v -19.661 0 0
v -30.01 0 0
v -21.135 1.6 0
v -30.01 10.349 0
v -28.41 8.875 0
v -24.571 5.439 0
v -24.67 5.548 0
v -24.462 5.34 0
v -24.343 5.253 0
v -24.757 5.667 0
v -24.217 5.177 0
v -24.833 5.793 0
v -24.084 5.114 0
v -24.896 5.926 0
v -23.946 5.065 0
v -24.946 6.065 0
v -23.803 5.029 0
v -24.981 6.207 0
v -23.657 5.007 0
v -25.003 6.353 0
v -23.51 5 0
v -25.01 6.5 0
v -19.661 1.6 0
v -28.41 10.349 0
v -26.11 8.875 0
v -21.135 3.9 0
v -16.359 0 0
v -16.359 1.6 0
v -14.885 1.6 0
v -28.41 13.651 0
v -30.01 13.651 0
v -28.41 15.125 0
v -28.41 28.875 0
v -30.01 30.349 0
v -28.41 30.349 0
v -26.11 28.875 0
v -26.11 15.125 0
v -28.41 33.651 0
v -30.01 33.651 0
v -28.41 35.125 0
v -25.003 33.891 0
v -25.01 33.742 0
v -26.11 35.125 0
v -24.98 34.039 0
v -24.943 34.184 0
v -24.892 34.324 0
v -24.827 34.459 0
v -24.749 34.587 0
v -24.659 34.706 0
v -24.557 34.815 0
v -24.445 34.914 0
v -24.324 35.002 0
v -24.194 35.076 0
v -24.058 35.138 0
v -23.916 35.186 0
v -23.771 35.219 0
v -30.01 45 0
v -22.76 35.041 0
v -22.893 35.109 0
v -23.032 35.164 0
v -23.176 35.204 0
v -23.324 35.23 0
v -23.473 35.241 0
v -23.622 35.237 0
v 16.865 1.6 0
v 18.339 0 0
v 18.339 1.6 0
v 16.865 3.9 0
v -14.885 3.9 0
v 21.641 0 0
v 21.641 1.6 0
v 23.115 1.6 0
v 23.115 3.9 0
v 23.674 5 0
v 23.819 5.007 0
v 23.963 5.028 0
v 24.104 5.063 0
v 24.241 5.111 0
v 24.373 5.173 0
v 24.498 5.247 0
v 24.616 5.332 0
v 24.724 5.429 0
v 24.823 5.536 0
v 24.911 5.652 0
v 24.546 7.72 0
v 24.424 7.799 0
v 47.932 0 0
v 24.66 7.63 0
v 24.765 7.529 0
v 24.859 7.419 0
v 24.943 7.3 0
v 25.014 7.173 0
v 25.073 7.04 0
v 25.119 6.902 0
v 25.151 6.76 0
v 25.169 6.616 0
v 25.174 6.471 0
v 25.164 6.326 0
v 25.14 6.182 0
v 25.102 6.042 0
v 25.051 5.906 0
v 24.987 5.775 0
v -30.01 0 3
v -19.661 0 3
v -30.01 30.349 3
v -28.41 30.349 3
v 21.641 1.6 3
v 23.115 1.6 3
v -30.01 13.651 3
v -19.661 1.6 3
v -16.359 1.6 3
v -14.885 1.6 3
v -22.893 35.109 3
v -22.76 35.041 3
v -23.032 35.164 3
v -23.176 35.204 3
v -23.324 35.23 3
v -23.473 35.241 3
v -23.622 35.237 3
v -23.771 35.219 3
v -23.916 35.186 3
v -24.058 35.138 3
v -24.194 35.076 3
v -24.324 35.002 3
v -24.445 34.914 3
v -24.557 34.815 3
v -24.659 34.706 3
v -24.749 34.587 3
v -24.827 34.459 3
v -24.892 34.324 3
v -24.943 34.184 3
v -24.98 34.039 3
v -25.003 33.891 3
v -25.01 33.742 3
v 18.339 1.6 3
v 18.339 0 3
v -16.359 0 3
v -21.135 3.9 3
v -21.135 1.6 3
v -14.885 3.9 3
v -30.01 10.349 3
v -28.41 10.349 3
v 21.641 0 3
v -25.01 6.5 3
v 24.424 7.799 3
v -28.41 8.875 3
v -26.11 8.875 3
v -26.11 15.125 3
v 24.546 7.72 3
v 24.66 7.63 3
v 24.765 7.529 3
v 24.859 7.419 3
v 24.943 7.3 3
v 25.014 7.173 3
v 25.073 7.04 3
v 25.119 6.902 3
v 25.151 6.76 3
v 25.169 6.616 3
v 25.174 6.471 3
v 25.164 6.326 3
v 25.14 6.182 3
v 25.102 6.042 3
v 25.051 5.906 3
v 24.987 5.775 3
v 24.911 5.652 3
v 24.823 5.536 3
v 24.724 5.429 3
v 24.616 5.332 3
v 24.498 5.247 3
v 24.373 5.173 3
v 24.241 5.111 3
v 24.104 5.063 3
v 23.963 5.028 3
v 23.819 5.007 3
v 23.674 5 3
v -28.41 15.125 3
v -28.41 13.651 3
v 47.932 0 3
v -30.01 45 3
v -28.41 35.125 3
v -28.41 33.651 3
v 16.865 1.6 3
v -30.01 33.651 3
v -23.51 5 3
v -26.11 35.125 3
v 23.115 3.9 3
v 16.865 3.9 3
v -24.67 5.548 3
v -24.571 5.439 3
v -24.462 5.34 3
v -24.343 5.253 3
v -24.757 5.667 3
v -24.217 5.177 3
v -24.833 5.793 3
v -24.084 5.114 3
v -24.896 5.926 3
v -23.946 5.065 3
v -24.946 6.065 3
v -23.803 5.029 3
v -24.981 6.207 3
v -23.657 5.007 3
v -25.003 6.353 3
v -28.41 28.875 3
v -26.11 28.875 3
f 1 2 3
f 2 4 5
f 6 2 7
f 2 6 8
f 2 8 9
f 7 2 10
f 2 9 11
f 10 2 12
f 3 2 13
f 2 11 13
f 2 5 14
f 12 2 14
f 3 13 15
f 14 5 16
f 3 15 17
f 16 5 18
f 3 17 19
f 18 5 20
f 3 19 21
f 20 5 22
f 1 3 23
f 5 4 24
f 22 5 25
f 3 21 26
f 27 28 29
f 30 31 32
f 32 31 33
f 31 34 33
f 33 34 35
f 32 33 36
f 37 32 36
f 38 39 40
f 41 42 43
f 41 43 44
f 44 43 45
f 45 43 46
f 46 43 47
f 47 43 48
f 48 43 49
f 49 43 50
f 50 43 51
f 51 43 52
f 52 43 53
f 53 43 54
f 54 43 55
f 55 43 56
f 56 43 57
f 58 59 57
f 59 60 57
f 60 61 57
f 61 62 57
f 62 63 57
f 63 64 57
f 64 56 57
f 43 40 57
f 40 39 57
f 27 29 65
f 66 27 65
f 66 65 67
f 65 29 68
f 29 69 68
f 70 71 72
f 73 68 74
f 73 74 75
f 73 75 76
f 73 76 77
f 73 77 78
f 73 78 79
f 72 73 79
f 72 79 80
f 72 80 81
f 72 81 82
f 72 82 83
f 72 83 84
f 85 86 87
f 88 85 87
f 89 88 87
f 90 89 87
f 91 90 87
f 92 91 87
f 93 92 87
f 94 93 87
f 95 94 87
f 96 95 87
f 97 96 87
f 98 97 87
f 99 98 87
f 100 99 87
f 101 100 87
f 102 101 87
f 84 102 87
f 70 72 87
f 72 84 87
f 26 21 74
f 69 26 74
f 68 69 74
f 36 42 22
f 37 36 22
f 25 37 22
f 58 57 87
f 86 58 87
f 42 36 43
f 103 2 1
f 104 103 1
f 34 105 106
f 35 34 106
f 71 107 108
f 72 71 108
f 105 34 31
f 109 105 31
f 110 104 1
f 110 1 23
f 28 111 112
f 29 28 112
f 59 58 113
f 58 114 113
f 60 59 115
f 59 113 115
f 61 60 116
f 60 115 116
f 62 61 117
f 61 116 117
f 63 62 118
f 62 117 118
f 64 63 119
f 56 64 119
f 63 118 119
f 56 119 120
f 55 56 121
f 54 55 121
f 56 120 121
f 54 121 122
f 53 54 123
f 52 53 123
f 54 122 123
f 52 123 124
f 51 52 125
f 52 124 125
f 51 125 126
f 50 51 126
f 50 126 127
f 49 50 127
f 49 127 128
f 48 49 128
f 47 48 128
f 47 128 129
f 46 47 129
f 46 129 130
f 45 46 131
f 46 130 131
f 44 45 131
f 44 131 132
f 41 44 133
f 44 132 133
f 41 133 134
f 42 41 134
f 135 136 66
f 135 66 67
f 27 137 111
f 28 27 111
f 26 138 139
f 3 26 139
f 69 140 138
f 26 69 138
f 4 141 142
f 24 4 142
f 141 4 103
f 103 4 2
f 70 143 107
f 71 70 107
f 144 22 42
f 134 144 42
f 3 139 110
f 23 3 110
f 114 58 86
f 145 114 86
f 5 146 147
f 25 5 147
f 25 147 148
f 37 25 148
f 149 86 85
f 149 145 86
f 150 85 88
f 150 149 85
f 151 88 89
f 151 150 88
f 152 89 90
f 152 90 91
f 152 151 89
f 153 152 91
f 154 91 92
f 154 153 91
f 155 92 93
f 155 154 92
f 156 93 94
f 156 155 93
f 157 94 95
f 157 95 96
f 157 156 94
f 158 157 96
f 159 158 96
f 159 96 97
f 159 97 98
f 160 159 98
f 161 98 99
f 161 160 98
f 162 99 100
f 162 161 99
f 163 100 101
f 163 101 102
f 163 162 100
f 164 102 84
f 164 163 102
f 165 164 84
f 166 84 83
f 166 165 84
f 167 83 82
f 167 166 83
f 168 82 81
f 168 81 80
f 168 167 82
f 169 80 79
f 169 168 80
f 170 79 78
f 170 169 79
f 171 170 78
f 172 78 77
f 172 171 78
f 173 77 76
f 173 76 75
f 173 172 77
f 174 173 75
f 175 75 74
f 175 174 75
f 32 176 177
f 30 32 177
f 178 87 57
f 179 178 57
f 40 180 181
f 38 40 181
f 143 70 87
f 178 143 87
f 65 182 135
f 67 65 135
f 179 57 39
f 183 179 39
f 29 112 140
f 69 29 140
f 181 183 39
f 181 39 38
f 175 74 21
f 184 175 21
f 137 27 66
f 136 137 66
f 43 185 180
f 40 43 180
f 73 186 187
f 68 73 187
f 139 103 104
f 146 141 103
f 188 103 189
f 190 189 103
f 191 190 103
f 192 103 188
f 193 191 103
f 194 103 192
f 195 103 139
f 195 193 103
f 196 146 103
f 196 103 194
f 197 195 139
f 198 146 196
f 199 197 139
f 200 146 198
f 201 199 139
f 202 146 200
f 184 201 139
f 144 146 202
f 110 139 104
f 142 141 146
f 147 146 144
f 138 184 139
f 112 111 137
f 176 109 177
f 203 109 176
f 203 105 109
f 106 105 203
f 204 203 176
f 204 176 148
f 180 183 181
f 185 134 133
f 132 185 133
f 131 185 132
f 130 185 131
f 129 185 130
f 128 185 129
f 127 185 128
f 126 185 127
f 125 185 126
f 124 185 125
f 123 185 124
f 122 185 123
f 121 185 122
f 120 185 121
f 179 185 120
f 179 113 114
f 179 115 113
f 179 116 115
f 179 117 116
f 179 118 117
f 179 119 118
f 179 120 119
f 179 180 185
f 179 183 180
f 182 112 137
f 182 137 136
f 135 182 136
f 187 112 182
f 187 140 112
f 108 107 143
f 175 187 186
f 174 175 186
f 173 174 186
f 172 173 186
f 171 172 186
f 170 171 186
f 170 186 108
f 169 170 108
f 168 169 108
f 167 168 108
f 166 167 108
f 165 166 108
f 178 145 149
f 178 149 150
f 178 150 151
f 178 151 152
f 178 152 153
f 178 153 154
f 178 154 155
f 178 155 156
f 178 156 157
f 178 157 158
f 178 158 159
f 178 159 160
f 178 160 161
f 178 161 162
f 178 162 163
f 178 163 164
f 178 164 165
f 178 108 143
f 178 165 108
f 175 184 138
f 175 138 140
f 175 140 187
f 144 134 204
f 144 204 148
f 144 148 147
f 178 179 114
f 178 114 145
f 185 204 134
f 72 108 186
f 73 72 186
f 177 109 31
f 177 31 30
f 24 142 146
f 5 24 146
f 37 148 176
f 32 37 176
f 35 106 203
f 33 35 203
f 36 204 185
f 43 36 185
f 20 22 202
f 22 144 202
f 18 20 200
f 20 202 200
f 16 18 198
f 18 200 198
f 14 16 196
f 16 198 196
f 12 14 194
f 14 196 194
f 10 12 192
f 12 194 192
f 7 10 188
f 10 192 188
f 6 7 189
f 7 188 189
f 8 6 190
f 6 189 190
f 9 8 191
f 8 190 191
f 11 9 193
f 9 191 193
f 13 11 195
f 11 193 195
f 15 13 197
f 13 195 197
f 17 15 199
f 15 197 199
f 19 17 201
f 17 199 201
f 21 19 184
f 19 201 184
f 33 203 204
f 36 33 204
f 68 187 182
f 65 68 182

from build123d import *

# Parameters (mm, degrees)
F1_DEPTH = 3
F2_R     = 1.5
F3_W     = 3.302
F3_H     = 1.6
F3_W_2   = 1.6
F3_H_2   = 3.302
F4_DEPTH = 3.001


with BuildPart() as f1:
    # F0 (on Top) → F1 (new body)
    with BuildSketch(Plane.XY):
        Polygon((-30.010116, 45), (-30.010116, 0), (47.93217, 0), align=None)
        Polygon((29.271916, 5), (-25.010116, 5), (-25.010116, 36.339746), align=None, mode=Mode.SUBTRACT)
    extrude(amount=F1_DEPTH)

    # F2
    f2_edges = [f1.edges().sort_by_distance(p)[0] for p in [
        (-25.010116, 36.339746, 1.5),
        (29.271916, 5, 1.5),
        (-25.010116, 5, 1.5),
    ]]
    fillet(f2_edges, radius=F2_R)

    # F3 (on face) → F4 (cut, through all)
    with BuildSketch(Plane.XY.offset(3)):
        Polygon((-28.410116, 35.125), (-28.410116, 33.651), (-28.410116, 30.349), (-28.410116, 28.875), (-26.110116, 28.875), (-26.110116, 35.125), align=None)
        Polygon((-28.410116, 13.651), (-28.410116, 10.349), (-28.410116, 8.875), (-26.110116, 8.875), (-26.110116, 15.125), (-28.410116, 15.125), align=None)
        Polygon((-19.661116, 1.6), (-16.359116, 1.6), (-14.885116, 1.6), (-14.885116, 3.9), (-21.135116, 3.9), (-21.135116, 1.6), align=None)
        Polygon((21.640884, 1.6), (23.114884, 1.6), (23.114884, 3.9), (16.864884, 3.9), (16.864884, 1.6), (18.338884, 1.6), align=None)
        with Locations((19.989884, 0.8)):
            Rectangle(F3_W, F3_H)
        with Locations((-29.210116, 32)):
            Rectangle(F3_W_2, F3_H_2)
        with Locations((-18.010116, 0.8)):
            Rectangle(F3_W, F3_H)
        with Locations((-29.210116, 12)):
            Rectangle(F3_W_2, F3_H_2)
    extrude(amount=-F4_DEPTH, mode=Mode.SUBTRACT)


solid = f1.part
